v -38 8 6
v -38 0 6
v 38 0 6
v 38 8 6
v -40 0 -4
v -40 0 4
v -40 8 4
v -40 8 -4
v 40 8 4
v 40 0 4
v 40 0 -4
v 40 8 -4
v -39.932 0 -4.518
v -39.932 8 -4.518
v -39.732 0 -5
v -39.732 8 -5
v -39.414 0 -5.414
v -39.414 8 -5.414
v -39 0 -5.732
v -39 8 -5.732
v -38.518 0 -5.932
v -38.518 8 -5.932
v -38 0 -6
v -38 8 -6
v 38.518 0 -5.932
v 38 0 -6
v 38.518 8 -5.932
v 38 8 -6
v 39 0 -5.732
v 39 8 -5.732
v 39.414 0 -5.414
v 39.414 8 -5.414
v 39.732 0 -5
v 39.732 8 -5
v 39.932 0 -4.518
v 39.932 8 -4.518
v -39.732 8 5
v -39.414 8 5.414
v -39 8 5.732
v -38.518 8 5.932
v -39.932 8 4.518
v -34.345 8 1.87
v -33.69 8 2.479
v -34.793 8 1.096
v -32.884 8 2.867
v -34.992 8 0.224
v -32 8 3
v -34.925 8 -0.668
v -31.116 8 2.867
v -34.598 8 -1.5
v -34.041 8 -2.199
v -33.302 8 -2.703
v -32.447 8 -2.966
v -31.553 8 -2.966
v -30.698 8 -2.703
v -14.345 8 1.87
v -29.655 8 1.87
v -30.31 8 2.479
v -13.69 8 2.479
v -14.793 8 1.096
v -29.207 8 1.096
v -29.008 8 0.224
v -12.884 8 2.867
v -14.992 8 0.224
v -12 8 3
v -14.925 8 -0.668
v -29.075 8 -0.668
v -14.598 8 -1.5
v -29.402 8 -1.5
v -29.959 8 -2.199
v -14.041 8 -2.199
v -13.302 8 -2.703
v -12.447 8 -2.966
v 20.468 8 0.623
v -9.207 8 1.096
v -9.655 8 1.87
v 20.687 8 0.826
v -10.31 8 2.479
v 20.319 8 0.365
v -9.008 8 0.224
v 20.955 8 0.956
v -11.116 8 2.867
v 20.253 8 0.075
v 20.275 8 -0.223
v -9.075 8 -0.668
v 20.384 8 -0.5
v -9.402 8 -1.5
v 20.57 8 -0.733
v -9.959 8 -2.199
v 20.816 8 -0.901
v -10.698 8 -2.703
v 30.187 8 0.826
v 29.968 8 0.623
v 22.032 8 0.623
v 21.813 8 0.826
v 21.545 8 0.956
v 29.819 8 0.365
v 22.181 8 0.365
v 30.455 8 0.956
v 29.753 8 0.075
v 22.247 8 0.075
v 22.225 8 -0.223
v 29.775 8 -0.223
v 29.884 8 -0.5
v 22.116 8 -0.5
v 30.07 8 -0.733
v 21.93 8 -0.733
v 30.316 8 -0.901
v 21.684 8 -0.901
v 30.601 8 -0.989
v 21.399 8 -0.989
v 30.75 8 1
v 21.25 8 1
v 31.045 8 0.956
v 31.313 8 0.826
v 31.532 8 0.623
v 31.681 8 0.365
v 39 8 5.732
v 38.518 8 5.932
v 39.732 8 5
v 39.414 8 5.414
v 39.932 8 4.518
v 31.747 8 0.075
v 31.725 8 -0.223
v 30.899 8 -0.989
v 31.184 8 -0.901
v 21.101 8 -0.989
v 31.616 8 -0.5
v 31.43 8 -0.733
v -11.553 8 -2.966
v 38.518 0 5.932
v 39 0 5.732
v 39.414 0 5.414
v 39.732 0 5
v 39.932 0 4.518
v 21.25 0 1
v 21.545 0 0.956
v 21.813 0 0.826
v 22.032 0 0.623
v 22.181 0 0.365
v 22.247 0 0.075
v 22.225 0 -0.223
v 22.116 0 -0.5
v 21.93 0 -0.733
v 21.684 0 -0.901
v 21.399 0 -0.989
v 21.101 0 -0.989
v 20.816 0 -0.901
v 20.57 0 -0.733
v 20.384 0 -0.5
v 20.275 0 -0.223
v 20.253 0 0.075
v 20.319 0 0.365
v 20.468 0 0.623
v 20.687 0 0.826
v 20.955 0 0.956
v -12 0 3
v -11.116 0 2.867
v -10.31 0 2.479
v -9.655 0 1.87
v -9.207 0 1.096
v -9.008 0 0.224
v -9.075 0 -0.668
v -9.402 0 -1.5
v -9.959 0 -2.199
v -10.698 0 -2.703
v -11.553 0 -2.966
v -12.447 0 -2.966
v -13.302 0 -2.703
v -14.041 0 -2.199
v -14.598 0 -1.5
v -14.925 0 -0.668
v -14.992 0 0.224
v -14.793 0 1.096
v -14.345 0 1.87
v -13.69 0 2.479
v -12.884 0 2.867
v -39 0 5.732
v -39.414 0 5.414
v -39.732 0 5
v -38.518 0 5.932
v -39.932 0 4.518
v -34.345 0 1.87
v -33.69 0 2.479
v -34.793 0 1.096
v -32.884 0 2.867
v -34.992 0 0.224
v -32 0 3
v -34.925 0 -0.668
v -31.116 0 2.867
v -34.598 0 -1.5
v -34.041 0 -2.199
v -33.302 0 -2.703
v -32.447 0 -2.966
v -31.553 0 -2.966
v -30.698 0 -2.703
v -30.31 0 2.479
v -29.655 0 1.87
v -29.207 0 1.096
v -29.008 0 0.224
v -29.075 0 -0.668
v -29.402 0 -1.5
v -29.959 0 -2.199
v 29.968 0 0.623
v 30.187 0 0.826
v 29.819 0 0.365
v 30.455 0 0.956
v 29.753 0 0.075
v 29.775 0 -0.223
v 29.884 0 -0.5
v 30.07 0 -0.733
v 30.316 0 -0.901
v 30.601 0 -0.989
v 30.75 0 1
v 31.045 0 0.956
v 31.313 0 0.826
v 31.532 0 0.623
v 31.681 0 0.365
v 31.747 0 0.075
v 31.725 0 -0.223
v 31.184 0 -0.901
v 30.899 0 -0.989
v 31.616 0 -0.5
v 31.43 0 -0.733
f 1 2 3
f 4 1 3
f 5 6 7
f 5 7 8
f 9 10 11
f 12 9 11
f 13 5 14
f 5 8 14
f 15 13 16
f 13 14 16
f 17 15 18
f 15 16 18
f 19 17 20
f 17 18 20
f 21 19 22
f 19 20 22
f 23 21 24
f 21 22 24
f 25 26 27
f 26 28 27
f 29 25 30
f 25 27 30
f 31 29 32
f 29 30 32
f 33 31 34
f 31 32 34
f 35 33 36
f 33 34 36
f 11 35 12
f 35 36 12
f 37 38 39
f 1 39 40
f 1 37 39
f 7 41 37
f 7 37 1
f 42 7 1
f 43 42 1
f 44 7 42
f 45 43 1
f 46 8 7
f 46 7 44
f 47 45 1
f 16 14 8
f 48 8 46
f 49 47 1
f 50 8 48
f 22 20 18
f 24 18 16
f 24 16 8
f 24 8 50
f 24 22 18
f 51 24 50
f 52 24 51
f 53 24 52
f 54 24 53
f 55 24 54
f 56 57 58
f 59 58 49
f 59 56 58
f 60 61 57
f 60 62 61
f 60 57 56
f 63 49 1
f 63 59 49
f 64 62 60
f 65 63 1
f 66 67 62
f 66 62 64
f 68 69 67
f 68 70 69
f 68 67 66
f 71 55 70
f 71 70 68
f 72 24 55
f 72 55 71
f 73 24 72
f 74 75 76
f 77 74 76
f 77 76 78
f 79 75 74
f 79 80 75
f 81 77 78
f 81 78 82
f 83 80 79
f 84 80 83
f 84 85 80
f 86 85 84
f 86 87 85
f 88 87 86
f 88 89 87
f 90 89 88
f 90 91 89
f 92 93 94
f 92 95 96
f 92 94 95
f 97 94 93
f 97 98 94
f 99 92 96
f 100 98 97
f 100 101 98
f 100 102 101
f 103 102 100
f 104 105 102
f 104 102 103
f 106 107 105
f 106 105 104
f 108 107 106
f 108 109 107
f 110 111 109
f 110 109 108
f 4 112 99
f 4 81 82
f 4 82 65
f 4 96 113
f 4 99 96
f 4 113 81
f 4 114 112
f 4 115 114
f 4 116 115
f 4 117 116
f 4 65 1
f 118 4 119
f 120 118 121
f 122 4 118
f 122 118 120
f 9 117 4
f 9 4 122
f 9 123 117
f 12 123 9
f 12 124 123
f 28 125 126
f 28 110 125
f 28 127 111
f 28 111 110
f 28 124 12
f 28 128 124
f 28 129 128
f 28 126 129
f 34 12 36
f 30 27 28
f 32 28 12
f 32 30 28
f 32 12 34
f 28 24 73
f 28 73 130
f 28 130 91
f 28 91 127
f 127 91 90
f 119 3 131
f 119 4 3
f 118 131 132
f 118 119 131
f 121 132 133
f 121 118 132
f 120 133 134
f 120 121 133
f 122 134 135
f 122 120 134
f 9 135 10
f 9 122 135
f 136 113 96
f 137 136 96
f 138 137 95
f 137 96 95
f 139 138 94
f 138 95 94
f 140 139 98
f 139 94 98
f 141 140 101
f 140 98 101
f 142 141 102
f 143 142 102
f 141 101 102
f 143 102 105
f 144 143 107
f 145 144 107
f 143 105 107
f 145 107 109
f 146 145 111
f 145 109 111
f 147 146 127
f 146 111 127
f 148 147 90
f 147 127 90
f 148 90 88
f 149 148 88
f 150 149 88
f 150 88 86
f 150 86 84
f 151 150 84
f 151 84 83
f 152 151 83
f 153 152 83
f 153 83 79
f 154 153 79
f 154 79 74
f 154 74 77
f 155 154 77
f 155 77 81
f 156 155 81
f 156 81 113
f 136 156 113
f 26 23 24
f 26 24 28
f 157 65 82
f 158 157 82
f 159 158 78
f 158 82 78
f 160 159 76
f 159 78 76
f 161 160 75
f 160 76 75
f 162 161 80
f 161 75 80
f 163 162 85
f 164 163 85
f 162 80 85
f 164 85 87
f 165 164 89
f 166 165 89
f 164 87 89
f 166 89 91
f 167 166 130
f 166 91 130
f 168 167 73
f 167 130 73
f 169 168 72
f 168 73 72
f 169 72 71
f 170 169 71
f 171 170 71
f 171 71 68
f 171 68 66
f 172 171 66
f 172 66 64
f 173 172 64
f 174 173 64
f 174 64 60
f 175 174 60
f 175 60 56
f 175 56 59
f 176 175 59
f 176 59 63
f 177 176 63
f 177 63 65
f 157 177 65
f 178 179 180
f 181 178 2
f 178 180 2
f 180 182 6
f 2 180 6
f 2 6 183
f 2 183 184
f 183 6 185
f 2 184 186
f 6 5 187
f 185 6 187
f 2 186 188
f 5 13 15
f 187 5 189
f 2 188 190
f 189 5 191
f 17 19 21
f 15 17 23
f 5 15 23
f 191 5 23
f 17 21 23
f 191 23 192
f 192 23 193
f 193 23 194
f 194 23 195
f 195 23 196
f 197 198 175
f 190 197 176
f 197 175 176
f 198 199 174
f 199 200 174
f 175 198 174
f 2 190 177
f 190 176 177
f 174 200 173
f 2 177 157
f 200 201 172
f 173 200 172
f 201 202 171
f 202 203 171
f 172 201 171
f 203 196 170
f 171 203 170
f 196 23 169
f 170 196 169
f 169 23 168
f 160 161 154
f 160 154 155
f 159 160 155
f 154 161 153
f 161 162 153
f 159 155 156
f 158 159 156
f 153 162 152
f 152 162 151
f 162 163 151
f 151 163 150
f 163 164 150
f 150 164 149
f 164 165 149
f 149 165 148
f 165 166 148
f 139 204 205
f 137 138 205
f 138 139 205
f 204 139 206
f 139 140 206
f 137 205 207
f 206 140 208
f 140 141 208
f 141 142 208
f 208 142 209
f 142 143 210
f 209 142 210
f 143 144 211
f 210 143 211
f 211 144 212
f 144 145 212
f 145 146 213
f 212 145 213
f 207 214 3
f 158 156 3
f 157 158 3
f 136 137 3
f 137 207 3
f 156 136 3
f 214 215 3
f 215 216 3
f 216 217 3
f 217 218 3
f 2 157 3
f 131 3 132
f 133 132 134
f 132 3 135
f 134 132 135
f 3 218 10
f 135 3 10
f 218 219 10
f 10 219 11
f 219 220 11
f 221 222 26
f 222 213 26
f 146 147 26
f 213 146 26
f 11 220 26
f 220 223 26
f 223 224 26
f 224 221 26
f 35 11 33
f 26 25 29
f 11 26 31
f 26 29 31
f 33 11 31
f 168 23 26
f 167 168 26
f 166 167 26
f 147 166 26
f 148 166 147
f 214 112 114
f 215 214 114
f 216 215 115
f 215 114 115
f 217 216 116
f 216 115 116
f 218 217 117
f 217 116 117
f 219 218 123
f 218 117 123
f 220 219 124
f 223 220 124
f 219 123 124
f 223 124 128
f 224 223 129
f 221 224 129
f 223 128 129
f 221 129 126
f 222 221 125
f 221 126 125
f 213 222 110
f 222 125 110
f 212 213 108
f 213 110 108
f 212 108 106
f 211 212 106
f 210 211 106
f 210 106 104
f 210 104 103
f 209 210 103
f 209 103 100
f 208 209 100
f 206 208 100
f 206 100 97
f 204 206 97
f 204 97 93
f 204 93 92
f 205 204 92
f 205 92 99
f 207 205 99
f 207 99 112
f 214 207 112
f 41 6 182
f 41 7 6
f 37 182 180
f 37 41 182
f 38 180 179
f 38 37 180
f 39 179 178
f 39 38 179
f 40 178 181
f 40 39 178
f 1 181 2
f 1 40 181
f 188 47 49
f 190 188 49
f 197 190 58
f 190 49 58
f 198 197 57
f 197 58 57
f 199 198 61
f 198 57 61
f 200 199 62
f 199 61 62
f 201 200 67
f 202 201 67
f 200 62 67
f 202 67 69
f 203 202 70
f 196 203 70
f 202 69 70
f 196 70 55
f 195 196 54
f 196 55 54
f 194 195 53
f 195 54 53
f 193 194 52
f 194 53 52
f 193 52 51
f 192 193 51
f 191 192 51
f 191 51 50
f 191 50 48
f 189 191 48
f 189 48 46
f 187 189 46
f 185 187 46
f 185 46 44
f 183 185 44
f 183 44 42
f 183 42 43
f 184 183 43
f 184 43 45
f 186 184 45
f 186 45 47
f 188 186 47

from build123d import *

# Parameters (mm, degrees)
SKETCH1_W           = 80
SKETCH1_H           = 12
BOSS_EXTRUDE1_DEPTH = 8
SKETCH2_R           = 3
SKETCH2_R_2         = 1
CUT_EXTRUDE1_DEPTH  = 42.231056256
FILLET1_R           = 2


with BuildPart() as part:
    # Sketch1 → Boss-Extrude1 (new body)
    with BuildSketch(Plane(origin=(0, 0, 0), x_dir=(1, 0, 0), z_dir=(0, 1, 0))):
        Rectangle(SKETCH1_W, SKETCH1_H)
    extrude(amount=BOSS_EXTRUDE1_DEPTH)

    # Sketch2 → Cut-Extrude1 (cut, through all)
    with BuildSketch(Plane(origin=(0, 8, 0), x_dir=(1, 0, 0), z_dir=(0, 1, 0))):
        with Locations(Location((-32, 0, 0), (0, 0, 270))):
            Circle(SKETCH2_R)
        with Locations(Location((-12, 0, 0), (0, 0, 270))):
            Circle(SKETCH2_R)
        with Locations(Location((21.25, 0, 0), (0, 0, 270))):
            Circle(SKETCH2_R_2)
        with Locations(Location((30.75, 0, 0), (0, 0, 270))):
            Circle(SKETCH2_R_2)
    extrude(amount=-CUT_EXTRUDE1_DEPTH, mode=Mode.SUBTRACT)

    # Fillet1
    fillet1_edges = [part.edges().sort_by_distance(p)[0] for p in [
        (40, 4, 6),
        (-40, 4, 6),
        (-40, 4, -6),
        (40, 4, -6),
    ]]
    fillet(fillet1_edges, radius=FILLET1_R)


solid = part.part
